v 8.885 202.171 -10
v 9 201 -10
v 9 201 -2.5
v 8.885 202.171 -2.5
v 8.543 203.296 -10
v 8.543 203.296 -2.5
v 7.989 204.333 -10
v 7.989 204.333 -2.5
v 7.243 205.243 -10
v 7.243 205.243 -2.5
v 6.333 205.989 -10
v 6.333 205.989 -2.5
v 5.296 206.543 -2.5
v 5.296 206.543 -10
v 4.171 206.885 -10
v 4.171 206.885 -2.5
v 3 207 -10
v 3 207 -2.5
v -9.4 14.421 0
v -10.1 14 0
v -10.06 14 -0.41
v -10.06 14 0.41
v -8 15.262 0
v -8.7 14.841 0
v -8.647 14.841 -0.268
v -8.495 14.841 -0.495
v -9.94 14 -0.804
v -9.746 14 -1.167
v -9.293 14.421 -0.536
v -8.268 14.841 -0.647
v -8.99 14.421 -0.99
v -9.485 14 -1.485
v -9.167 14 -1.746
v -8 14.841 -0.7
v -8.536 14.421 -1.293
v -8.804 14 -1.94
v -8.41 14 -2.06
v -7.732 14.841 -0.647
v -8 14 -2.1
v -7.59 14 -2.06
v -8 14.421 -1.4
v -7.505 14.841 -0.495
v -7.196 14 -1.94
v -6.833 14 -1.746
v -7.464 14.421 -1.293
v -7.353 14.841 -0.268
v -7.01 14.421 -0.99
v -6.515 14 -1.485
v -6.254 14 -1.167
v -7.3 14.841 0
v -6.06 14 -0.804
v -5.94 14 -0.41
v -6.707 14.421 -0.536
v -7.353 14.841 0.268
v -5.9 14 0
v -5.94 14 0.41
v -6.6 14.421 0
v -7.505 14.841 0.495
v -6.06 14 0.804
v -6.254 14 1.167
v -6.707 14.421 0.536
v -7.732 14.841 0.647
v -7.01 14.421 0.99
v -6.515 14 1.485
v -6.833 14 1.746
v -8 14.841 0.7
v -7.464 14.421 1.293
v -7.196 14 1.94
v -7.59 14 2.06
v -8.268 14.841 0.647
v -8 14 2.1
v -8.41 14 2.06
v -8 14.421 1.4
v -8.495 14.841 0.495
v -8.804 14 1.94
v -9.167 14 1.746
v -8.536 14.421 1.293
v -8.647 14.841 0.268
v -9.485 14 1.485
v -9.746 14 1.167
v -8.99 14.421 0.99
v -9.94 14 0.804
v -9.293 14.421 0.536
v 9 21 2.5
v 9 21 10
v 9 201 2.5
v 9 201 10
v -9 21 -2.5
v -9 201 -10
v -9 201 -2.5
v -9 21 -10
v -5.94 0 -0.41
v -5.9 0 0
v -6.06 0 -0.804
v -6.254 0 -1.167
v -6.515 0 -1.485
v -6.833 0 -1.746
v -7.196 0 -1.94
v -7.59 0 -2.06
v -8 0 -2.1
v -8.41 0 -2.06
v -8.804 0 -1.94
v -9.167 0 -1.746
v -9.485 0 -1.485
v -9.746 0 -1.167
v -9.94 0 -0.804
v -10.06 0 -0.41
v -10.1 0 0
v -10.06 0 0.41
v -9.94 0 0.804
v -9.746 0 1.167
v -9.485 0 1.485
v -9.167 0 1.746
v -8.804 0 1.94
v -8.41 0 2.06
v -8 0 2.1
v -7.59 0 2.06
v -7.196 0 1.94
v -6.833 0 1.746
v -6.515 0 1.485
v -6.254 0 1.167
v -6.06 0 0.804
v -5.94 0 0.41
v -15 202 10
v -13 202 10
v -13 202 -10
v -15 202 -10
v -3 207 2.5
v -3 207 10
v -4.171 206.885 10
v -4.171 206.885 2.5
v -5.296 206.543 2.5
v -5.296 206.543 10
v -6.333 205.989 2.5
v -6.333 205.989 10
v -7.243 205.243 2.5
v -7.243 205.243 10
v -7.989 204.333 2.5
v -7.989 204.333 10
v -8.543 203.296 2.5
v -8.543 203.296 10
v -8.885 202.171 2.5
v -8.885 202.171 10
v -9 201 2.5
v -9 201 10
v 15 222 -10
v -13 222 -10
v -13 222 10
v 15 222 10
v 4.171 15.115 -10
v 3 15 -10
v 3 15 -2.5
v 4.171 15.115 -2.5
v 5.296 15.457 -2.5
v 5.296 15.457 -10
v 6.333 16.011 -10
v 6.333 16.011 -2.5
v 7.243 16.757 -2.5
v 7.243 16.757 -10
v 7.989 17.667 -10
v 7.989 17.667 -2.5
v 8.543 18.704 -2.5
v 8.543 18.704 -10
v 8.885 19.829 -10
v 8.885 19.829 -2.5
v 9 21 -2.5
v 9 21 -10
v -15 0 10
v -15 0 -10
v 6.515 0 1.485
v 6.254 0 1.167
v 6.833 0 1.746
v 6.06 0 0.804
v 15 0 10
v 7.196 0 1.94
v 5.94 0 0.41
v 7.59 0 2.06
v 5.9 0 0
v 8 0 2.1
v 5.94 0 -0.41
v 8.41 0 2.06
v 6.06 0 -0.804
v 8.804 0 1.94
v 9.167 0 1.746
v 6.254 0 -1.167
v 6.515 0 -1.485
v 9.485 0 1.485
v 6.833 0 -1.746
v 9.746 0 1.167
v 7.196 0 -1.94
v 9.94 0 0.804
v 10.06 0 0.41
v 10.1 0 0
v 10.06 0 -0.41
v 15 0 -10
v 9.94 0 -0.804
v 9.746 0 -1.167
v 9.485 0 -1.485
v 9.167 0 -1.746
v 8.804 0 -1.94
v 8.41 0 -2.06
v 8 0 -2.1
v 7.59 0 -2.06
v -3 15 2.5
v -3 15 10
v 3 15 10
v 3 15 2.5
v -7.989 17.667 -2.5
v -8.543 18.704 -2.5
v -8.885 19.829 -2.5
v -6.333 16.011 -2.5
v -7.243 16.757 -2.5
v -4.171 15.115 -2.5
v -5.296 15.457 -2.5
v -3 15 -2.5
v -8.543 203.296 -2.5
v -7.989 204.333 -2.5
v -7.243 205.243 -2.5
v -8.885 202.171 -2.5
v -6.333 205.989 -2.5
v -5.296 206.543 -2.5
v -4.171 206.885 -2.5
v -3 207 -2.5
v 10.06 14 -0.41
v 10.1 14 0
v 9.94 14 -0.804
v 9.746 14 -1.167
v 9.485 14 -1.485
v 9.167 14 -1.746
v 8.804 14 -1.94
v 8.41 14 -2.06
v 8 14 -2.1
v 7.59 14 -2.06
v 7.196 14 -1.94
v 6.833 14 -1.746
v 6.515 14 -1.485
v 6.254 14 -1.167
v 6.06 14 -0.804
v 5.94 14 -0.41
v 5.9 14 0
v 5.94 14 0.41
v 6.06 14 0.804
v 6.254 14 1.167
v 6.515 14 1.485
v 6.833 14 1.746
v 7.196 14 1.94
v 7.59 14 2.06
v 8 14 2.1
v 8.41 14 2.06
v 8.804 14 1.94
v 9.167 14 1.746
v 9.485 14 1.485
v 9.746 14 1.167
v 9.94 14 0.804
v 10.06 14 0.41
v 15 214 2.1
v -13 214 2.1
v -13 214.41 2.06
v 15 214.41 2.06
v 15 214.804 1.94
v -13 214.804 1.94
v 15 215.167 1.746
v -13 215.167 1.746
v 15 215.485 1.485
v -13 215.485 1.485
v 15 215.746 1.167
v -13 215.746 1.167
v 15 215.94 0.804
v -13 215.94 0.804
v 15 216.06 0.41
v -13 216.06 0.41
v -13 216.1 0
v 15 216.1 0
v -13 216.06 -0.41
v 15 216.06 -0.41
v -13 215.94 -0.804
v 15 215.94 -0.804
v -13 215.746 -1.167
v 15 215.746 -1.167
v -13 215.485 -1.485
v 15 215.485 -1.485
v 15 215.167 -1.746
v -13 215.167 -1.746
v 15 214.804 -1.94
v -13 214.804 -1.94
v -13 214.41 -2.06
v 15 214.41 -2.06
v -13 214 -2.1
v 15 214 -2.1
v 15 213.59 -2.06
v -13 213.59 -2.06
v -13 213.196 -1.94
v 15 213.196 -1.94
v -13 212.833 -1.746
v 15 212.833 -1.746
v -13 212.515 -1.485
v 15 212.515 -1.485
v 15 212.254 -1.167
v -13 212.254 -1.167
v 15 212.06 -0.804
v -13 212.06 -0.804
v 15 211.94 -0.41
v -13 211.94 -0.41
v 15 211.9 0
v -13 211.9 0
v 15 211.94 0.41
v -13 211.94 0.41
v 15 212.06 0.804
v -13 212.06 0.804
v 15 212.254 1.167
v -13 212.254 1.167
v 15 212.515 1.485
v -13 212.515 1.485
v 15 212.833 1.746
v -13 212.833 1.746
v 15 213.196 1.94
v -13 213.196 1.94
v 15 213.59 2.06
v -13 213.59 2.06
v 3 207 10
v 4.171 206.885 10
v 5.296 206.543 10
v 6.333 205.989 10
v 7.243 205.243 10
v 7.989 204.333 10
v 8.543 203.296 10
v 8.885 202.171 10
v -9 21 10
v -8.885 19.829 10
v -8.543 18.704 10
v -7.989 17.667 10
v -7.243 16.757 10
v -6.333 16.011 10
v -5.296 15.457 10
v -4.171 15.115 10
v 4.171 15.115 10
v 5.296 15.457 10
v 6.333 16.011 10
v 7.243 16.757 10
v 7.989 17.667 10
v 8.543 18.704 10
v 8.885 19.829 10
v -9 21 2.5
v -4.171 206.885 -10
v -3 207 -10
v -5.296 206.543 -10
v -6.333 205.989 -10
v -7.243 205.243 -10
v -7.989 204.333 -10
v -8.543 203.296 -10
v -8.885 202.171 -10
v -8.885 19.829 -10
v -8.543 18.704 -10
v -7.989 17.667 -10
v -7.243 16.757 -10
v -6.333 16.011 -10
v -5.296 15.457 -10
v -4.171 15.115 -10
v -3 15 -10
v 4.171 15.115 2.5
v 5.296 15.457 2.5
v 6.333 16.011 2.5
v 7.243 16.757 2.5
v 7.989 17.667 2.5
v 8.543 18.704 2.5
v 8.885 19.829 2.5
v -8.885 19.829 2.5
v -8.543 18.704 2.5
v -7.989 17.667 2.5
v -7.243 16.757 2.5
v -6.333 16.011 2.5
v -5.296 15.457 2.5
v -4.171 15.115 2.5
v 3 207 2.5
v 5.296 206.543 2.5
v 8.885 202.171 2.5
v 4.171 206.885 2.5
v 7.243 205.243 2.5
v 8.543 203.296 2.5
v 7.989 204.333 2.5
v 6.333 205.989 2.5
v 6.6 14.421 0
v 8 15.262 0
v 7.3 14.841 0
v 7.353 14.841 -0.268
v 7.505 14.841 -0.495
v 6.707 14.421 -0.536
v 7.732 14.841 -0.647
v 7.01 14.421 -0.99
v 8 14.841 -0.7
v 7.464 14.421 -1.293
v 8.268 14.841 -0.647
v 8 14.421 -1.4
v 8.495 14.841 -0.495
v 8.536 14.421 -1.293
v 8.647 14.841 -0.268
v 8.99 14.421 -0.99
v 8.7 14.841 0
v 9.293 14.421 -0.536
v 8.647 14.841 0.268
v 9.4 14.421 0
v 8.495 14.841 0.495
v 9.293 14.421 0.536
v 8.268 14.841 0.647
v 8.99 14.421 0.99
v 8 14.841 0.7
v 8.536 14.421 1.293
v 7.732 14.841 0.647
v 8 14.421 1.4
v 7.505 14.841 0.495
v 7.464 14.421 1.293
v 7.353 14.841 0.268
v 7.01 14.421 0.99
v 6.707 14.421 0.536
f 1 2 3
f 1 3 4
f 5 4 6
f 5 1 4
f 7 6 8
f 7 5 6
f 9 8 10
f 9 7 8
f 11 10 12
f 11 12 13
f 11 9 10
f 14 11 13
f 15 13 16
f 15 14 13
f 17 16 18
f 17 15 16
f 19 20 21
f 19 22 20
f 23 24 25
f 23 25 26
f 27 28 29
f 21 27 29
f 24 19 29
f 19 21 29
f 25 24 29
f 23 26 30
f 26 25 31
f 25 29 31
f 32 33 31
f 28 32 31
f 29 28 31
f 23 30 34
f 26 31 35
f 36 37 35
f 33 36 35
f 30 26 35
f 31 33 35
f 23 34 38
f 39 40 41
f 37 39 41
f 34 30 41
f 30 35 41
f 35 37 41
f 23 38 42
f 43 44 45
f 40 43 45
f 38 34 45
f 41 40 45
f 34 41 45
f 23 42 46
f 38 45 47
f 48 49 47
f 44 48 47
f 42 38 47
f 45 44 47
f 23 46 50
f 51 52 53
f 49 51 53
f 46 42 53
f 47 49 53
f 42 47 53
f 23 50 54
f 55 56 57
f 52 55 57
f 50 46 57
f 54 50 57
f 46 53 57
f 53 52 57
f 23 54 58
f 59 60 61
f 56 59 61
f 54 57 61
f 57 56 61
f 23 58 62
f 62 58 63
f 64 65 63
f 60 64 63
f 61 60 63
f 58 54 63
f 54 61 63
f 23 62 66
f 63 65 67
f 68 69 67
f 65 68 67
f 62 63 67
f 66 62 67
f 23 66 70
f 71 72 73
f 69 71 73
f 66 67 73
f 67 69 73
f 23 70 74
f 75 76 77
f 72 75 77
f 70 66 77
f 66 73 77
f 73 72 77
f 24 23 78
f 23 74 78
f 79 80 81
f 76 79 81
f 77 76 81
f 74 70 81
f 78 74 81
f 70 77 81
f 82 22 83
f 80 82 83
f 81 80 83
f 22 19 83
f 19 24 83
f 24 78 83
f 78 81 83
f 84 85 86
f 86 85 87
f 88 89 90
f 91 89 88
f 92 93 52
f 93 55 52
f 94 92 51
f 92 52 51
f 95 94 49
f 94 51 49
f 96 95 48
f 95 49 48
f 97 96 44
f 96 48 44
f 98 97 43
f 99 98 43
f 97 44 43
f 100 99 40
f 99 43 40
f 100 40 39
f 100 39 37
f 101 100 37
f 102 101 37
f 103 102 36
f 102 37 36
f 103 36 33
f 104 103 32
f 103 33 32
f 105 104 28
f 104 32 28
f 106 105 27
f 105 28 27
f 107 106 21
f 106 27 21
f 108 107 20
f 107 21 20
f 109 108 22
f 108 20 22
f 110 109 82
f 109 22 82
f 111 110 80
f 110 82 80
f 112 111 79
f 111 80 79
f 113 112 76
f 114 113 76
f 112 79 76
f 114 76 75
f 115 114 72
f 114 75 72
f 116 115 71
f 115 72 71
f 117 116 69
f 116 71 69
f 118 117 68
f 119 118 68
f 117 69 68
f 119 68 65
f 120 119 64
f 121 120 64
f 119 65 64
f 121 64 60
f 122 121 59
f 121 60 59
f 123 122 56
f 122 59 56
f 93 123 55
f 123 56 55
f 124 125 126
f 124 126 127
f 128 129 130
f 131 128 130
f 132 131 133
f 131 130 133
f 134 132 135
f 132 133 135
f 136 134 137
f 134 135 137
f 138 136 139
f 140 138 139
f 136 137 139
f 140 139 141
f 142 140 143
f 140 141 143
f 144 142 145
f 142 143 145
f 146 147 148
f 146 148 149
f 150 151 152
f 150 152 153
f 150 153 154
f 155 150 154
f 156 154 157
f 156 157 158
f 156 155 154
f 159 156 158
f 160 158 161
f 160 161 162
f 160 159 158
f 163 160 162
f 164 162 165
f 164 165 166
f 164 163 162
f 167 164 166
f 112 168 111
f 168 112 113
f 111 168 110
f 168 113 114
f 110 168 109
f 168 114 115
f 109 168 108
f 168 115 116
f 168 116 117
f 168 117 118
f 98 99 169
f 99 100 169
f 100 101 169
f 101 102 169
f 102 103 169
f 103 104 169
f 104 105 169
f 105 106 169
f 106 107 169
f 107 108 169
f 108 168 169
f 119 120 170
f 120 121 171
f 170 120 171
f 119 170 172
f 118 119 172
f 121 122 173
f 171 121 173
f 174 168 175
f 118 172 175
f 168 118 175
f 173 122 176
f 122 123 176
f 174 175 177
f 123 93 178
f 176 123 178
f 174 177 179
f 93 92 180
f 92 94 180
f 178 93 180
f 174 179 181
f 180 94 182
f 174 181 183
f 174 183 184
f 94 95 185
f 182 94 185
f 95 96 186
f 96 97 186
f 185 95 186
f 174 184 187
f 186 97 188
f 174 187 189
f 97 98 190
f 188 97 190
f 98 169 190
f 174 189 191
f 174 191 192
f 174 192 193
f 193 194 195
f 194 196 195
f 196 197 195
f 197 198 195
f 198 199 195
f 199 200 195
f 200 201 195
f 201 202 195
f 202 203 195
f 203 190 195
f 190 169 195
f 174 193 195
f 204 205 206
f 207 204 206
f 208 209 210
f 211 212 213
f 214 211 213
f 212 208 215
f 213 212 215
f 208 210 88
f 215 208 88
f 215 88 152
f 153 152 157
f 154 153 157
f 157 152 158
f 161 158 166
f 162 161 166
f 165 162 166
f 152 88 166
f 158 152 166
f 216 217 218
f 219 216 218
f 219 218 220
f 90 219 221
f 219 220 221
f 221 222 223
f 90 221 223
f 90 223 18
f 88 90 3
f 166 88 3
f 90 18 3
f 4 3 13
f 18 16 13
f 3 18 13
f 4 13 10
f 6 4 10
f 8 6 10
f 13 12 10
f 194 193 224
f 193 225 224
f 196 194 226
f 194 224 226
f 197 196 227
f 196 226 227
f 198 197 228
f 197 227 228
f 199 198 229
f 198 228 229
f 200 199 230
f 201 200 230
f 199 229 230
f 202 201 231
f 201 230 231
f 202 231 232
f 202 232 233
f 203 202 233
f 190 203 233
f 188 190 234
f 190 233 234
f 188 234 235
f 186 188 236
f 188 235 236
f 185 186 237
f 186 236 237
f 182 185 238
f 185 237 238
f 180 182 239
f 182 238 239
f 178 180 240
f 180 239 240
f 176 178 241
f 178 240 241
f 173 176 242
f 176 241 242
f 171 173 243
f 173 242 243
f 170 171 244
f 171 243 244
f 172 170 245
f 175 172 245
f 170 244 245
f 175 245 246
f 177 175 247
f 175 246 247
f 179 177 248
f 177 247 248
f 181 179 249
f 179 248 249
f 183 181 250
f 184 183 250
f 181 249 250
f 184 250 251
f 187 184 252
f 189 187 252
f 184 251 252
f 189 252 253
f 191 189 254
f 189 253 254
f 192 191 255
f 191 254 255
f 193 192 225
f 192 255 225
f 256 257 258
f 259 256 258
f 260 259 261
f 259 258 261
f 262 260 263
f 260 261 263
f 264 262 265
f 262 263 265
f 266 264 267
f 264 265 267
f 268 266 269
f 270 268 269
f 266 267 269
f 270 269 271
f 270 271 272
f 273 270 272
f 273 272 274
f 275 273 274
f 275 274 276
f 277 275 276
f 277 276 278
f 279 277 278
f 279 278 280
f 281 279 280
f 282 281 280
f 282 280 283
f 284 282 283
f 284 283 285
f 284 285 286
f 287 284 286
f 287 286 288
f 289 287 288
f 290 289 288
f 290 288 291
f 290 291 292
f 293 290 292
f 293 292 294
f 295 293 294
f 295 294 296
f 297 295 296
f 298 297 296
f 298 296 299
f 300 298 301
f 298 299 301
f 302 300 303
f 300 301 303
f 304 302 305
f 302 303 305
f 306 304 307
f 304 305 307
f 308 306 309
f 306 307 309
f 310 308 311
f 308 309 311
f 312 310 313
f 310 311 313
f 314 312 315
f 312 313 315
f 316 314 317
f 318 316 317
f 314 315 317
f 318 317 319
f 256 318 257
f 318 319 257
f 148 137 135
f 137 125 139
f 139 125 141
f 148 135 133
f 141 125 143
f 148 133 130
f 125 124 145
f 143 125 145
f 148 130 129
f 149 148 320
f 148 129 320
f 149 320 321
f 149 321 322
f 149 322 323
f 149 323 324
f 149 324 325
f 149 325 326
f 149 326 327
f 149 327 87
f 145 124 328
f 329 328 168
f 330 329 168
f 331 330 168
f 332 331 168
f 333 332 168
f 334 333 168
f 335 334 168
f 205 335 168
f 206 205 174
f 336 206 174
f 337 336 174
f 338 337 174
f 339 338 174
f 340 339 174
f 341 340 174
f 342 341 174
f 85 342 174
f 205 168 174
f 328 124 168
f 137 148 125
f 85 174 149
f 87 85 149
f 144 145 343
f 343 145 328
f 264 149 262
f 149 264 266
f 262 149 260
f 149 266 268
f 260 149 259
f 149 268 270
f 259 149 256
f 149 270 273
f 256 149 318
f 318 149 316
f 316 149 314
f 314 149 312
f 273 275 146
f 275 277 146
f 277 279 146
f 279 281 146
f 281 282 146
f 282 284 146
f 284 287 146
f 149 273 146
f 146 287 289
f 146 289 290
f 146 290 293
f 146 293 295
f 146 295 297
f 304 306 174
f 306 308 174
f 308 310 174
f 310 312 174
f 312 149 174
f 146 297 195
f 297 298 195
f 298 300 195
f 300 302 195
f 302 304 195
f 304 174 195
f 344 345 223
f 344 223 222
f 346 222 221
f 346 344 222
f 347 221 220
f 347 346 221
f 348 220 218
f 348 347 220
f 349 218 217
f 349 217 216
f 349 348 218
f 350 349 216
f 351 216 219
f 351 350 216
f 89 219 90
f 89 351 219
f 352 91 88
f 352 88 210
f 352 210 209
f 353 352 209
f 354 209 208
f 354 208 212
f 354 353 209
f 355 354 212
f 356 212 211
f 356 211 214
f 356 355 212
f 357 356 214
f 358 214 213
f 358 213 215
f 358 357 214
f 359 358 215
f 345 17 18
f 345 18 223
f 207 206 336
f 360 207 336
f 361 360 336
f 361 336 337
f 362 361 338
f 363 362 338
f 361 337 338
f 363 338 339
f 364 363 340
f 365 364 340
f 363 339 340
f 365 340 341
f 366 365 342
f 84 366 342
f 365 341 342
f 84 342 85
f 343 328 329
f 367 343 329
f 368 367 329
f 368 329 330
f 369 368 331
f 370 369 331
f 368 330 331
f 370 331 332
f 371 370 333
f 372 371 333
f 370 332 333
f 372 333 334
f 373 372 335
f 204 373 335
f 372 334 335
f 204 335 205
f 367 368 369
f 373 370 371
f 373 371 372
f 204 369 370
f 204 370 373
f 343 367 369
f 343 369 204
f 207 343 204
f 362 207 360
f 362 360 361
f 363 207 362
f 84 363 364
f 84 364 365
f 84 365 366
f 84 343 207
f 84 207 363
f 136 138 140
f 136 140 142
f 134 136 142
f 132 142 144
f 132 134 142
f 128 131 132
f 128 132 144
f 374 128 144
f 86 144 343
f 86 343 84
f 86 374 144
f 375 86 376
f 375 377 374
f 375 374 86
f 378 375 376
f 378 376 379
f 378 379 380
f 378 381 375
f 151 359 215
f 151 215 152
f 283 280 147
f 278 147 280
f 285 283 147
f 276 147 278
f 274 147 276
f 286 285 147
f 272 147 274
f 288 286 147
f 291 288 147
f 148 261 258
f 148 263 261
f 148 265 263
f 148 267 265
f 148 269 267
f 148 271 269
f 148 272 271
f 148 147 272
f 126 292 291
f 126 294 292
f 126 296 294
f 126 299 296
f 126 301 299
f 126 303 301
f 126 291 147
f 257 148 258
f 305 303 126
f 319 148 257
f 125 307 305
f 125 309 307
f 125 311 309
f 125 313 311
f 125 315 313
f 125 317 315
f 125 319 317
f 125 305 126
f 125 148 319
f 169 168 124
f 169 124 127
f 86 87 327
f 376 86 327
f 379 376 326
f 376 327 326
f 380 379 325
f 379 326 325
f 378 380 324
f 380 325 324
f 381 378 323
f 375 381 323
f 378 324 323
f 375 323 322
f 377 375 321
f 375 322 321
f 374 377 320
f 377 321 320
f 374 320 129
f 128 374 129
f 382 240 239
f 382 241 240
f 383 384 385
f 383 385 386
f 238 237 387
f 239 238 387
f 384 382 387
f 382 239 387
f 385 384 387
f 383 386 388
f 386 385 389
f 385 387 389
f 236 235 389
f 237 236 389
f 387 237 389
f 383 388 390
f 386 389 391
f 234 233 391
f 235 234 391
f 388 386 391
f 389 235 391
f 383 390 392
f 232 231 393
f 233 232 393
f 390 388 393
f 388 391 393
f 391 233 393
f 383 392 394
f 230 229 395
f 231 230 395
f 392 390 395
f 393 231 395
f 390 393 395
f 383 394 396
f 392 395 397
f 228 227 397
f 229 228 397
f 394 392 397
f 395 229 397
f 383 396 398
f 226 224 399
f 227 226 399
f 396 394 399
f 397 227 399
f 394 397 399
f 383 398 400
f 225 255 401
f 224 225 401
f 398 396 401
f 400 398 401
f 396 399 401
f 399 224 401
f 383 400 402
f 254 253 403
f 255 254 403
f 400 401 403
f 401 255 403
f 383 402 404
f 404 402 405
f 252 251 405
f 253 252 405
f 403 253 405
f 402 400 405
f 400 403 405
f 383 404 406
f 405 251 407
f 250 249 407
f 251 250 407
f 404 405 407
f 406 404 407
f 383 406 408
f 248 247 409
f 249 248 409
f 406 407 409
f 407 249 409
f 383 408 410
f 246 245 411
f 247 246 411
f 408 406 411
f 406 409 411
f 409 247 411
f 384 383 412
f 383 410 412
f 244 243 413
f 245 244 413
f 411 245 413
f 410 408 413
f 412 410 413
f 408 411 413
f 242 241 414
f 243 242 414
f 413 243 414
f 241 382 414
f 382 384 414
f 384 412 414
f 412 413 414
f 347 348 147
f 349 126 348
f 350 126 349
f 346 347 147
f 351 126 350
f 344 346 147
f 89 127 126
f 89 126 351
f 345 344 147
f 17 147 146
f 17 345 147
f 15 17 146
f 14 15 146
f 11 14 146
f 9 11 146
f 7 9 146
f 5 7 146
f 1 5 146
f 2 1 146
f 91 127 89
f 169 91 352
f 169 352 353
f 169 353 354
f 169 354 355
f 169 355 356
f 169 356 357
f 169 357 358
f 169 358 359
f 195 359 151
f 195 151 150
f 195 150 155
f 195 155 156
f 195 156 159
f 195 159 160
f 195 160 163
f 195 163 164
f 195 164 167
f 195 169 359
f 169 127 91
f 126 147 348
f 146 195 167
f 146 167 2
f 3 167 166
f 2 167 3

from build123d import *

# Parameters (mm, degrees)
SKETCH_1_W             = 30
SKETCH_1_H             = 20
EXTRUDE_1_DEPTH        = 222
CUT_EXTRUDE_1_DEPTH    = 7.5
HOLE_WIZARD_M5_1_D     = 4.2
HOLE_WIZARD_M5_1_DEPTH = 14
HOLE_WIZARD_M5_1_TIP   = 1.2618073
HOLE_WIZARD_M5_2_D     = 4.2
CUT_EXTRUDE_2_DEPTH    = 224.403222895


with BuildPart() as part:
    # 草图1 → 凸台-拉伸1 (new body)
    with BuildSketch(Plane(origin=(0, 0, 0), x_dir=(1, 0, 0), z_dir=(0, 1, 0))):
        Rectangle(SKETCH_1_W, SKETCH_1_H)
    extrude(amount=EXTRUDE_1_DEPTH)

    # 草图2 → 切除-拉伸1 (cut)
    with BuildSketch(Plane.XY.offset(-10)):
        with BuildLine():
            Line((-3, 15), (3, 15))
            ThreePointArc((3, 15), (7.242640687, 16.757359313), (9, 21))
            Line((9, 21), (9, 201))
            ThreePointArc((9, 201), (7.242640687, 205.242640687), (3, 207))
            Line((3, 207), (-3, 207))
            ThreePointArc((-3, 207), (-7.242640687, 205.242640687), (-9, 201))
            Line((-9, 201), (-9, 21))
            ThreePointArc((-9, 21), (-7.242640687, 16.757359313), (-3, 15))
        make_face()
    cut_extrude_1 = extrude(amount=CUT_EXTRUDE_1_DEPTH, mode=Mode.SUBTRACT)

    # 镜向1: 切除-拉伸1 across plane
    add(cut_extrude_1.mirror(Plane.XY), mode=Mode.SUBTRACT)

    # M5 螺纹孔1
    with Locations(Plane(origin=(0, 0, 0), x_dir=(-1, 0, 0), z_dir=(0, -1, 0))):
        with Locations((8, 0), (-8, 0)):
            Hole(HOLE_WIZARD_M5_1_D / 2, depth=HOLE_WIZARD_M5_1_DEPTH)
            with Locations((0, 0, -(HOLE_WIZARD_M5_1_DEPTH + HOLE_WIZARD_M5_1_TIP / 2))):  # 118° drill point
                Cone(0, HOLE_WIZARD_M5_1_D / 2, HOLE_WIZARD_M5_1_TIP, mode=Mode.SUBTRACT)

    # M5 螺纹孔2 (through all)
    with Locations(Plane(origin=(15, 0, 0), x_dir=(0, 0, -1), z_dir=(1, 0, 0))):
        with Locations((0, 214)):
            Hole(HOLE_WIZARD_M5_2_D / 2)

    # 草图7 → 切除-拉伸2 (cut, through all)
    with BuildSketch(Plane(origin=(0, 0, 10), x_dir=(-1, 0, 0), z_dir=(0, 0, -1))):
        Polygon((13, 679.517597419), (13, 222), (13, 202), (15, 202), (472.517597419, 202), (1131.852642703, 836.481446423), (672.335045283, 1313.999043842), align=None)
    extrude(amount=CUT_EXTRUDE_2_DEPTH, mode=Mode.SUBTRACT)


solid = part.part
